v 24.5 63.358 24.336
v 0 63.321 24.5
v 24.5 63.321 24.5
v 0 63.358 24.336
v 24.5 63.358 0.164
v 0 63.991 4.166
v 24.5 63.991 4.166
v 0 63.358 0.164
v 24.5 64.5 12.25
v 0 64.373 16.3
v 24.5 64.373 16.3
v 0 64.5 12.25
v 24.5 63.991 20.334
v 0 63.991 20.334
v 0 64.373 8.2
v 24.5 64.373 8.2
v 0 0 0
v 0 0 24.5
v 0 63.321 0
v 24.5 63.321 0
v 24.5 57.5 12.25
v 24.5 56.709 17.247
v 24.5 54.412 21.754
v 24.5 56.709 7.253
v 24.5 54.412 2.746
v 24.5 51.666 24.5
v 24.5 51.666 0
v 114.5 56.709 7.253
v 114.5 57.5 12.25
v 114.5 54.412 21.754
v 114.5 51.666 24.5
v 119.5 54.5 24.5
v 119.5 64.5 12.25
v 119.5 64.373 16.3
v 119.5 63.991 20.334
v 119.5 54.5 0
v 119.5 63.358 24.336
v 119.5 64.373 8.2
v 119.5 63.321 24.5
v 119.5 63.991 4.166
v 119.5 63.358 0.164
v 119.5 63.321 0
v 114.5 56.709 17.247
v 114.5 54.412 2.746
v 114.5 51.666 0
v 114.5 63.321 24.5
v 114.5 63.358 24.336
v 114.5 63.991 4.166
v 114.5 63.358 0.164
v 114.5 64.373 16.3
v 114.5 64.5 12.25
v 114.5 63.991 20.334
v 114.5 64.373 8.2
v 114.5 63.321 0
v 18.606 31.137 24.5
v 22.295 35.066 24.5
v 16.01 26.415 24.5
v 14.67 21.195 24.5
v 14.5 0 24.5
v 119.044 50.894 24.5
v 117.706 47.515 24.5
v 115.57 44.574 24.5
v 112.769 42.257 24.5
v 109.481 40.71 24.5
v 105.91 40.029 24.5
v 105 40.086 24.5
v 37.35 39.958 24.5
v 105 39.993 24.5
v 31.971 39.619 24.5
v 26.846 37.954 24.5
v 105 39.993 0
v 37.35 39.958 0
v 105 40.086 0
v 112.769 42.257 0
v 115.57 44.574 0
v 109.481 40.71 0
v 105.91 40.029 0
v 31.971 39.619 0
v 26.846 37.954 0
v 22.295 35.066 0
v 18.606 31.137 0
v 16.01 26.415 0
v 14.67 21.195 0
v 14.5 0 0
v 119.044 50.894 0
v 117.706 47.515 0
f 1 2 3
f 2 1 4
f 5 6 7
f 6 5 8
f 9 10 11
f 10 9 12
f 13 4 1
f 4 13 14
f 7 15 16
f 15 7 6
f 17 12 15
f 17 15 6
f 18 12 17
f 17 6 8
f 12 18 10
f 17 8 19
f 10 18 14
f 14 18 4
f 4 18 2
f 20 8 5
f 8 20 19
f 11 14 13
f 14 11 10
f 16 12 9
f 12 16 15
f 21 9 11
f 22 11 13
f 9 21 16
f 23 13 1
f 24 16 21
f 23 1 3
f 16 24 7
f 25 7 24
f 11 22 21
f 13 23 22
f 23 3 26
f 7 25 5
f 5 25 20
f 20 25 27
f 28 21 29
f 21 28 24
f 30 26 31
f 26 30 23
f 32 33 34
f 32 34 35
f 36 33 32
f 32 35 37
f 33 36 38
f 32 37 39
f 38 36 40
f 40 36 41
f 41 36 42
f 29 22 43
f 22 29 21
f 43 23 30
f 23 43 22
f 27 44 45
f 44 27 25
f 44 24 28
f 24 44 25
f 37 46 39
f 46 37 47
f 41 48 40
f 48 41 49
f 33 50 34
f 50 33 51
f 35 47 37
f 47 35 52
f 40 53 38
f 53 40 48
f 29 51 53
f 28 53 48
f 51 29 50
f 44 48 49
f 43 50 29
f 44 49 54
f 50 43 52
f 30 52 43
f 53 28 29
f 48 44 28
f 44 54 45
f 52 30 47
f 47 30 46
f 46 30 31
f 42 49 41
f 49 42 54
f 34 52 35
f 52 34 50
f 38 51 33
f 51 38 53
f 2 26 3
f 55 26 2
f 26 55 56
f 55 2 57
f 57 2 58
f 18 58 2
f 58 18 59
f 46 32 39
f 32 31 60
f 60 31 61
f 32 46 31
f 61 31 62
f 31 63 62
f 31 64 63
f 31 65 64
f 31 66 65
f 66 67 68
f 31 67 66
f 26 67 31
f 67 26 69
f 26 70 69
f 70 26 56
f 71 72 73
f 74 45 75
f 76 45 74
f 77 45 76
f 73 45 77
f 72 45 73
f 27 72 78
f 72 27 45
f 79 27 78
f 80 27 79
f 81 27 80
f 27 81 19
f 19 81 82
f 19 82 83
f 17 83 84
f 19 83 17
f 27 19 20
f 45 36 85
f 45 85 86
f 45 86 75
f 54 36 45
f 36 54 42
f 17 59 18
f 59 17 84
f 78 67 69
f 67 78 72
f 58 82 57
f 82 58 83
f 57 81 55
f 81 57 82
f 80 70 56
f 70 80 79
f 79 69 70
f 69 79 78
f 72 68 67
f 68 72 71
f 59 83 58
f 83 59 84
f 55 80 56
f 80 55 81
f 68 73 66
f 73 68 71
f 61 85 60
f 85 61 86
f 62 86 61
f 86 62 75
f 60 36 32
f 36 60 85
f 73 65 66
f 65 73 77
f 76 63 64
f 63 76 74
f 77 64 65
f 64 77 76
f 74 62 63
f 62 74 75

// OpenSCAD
//Height of the tower below the spindle
arm_height = 40;

//Length of the spindle
arm_length = 90;

module tcube(x, y, z, tx = 0, ty = 0, tz = 0) {
	translate([tx, ty, tz]) {
		cube([x, y, z]);
	}
}

module tcyl(r, h, tx = 0, ty = 0, tz = 0, center = false, $fn = $fn) {
	translate([tx, ty, tz]) {
		cylinder(r = r, h = h, center = center, $fn = $fn);
	}
}

module ccube(x, y, z, ty = 0, tz = 0) {
	tcube(x, y, z, -x / 2, ty, tz);
}

module spool_arm() {
	$fn =25;

	//fit of 2 pieces
	clearance = .5;

	hole_x = 15;
	hole_y = 25;
	arm_offset = 10;
	lip_x = 5;
	lip_y = 7;

	module arm() {
		thickness = hole_y - clearance;
		bar = hole_x - clearance;
		spindle_length = bar + arm_length + arm_offset + lip_x;
		spindle_depth = thickness;
		height = arm_height + spindle_depth;
		brace_r = bar + lip_y;
		t2 = thickness + 2;

		module L() {
			difference() {
				tcube(spindle_length, height, thickness);

				hull() {
					tcube(1, 1, t2, spindle_length, height - spindle_depth - 1, -1);
					tcube(1, 1, t2, spindle_length, -1, -1);
					tcube(1, 1, t2, bar, -1, -1);
					tcyl(brace_r, t2, bar + brace_r, height - spindle_depth - brace_r, -1);
				}

				tcube(bar + 1, bar + 1, t2, spindle_length - bar, height - spindle_depth - 1, -1);
			}
			tcyl(bar, thickness, spindle_length - bar, height - spindle_depth + bar);
		}

		module ring() {
			lip_r = height;
			spindle_r = thickness * .66;
			$fn = 100;
			ty = height - spindle_r - lip_y;

			tcyl(lip_r, bar + arm_offset, $fn = $fn);
			tcyl(spindle_r, spindle_length, ty = ty, $fn = 20);
			ccube(2 * spindle_r, ty, spindle_length );
			tcyl(lip_r, lip_x, tz = spindle_length - lip_x, $fn = $fn);
		}

		intersection() {
	
			translate([0, 0, thickness / 2]) {
				rotate([0, 90, 0]) {
					ring();
				}
			}

			L();
		}

	}

	arm();

}

spool_arm();
